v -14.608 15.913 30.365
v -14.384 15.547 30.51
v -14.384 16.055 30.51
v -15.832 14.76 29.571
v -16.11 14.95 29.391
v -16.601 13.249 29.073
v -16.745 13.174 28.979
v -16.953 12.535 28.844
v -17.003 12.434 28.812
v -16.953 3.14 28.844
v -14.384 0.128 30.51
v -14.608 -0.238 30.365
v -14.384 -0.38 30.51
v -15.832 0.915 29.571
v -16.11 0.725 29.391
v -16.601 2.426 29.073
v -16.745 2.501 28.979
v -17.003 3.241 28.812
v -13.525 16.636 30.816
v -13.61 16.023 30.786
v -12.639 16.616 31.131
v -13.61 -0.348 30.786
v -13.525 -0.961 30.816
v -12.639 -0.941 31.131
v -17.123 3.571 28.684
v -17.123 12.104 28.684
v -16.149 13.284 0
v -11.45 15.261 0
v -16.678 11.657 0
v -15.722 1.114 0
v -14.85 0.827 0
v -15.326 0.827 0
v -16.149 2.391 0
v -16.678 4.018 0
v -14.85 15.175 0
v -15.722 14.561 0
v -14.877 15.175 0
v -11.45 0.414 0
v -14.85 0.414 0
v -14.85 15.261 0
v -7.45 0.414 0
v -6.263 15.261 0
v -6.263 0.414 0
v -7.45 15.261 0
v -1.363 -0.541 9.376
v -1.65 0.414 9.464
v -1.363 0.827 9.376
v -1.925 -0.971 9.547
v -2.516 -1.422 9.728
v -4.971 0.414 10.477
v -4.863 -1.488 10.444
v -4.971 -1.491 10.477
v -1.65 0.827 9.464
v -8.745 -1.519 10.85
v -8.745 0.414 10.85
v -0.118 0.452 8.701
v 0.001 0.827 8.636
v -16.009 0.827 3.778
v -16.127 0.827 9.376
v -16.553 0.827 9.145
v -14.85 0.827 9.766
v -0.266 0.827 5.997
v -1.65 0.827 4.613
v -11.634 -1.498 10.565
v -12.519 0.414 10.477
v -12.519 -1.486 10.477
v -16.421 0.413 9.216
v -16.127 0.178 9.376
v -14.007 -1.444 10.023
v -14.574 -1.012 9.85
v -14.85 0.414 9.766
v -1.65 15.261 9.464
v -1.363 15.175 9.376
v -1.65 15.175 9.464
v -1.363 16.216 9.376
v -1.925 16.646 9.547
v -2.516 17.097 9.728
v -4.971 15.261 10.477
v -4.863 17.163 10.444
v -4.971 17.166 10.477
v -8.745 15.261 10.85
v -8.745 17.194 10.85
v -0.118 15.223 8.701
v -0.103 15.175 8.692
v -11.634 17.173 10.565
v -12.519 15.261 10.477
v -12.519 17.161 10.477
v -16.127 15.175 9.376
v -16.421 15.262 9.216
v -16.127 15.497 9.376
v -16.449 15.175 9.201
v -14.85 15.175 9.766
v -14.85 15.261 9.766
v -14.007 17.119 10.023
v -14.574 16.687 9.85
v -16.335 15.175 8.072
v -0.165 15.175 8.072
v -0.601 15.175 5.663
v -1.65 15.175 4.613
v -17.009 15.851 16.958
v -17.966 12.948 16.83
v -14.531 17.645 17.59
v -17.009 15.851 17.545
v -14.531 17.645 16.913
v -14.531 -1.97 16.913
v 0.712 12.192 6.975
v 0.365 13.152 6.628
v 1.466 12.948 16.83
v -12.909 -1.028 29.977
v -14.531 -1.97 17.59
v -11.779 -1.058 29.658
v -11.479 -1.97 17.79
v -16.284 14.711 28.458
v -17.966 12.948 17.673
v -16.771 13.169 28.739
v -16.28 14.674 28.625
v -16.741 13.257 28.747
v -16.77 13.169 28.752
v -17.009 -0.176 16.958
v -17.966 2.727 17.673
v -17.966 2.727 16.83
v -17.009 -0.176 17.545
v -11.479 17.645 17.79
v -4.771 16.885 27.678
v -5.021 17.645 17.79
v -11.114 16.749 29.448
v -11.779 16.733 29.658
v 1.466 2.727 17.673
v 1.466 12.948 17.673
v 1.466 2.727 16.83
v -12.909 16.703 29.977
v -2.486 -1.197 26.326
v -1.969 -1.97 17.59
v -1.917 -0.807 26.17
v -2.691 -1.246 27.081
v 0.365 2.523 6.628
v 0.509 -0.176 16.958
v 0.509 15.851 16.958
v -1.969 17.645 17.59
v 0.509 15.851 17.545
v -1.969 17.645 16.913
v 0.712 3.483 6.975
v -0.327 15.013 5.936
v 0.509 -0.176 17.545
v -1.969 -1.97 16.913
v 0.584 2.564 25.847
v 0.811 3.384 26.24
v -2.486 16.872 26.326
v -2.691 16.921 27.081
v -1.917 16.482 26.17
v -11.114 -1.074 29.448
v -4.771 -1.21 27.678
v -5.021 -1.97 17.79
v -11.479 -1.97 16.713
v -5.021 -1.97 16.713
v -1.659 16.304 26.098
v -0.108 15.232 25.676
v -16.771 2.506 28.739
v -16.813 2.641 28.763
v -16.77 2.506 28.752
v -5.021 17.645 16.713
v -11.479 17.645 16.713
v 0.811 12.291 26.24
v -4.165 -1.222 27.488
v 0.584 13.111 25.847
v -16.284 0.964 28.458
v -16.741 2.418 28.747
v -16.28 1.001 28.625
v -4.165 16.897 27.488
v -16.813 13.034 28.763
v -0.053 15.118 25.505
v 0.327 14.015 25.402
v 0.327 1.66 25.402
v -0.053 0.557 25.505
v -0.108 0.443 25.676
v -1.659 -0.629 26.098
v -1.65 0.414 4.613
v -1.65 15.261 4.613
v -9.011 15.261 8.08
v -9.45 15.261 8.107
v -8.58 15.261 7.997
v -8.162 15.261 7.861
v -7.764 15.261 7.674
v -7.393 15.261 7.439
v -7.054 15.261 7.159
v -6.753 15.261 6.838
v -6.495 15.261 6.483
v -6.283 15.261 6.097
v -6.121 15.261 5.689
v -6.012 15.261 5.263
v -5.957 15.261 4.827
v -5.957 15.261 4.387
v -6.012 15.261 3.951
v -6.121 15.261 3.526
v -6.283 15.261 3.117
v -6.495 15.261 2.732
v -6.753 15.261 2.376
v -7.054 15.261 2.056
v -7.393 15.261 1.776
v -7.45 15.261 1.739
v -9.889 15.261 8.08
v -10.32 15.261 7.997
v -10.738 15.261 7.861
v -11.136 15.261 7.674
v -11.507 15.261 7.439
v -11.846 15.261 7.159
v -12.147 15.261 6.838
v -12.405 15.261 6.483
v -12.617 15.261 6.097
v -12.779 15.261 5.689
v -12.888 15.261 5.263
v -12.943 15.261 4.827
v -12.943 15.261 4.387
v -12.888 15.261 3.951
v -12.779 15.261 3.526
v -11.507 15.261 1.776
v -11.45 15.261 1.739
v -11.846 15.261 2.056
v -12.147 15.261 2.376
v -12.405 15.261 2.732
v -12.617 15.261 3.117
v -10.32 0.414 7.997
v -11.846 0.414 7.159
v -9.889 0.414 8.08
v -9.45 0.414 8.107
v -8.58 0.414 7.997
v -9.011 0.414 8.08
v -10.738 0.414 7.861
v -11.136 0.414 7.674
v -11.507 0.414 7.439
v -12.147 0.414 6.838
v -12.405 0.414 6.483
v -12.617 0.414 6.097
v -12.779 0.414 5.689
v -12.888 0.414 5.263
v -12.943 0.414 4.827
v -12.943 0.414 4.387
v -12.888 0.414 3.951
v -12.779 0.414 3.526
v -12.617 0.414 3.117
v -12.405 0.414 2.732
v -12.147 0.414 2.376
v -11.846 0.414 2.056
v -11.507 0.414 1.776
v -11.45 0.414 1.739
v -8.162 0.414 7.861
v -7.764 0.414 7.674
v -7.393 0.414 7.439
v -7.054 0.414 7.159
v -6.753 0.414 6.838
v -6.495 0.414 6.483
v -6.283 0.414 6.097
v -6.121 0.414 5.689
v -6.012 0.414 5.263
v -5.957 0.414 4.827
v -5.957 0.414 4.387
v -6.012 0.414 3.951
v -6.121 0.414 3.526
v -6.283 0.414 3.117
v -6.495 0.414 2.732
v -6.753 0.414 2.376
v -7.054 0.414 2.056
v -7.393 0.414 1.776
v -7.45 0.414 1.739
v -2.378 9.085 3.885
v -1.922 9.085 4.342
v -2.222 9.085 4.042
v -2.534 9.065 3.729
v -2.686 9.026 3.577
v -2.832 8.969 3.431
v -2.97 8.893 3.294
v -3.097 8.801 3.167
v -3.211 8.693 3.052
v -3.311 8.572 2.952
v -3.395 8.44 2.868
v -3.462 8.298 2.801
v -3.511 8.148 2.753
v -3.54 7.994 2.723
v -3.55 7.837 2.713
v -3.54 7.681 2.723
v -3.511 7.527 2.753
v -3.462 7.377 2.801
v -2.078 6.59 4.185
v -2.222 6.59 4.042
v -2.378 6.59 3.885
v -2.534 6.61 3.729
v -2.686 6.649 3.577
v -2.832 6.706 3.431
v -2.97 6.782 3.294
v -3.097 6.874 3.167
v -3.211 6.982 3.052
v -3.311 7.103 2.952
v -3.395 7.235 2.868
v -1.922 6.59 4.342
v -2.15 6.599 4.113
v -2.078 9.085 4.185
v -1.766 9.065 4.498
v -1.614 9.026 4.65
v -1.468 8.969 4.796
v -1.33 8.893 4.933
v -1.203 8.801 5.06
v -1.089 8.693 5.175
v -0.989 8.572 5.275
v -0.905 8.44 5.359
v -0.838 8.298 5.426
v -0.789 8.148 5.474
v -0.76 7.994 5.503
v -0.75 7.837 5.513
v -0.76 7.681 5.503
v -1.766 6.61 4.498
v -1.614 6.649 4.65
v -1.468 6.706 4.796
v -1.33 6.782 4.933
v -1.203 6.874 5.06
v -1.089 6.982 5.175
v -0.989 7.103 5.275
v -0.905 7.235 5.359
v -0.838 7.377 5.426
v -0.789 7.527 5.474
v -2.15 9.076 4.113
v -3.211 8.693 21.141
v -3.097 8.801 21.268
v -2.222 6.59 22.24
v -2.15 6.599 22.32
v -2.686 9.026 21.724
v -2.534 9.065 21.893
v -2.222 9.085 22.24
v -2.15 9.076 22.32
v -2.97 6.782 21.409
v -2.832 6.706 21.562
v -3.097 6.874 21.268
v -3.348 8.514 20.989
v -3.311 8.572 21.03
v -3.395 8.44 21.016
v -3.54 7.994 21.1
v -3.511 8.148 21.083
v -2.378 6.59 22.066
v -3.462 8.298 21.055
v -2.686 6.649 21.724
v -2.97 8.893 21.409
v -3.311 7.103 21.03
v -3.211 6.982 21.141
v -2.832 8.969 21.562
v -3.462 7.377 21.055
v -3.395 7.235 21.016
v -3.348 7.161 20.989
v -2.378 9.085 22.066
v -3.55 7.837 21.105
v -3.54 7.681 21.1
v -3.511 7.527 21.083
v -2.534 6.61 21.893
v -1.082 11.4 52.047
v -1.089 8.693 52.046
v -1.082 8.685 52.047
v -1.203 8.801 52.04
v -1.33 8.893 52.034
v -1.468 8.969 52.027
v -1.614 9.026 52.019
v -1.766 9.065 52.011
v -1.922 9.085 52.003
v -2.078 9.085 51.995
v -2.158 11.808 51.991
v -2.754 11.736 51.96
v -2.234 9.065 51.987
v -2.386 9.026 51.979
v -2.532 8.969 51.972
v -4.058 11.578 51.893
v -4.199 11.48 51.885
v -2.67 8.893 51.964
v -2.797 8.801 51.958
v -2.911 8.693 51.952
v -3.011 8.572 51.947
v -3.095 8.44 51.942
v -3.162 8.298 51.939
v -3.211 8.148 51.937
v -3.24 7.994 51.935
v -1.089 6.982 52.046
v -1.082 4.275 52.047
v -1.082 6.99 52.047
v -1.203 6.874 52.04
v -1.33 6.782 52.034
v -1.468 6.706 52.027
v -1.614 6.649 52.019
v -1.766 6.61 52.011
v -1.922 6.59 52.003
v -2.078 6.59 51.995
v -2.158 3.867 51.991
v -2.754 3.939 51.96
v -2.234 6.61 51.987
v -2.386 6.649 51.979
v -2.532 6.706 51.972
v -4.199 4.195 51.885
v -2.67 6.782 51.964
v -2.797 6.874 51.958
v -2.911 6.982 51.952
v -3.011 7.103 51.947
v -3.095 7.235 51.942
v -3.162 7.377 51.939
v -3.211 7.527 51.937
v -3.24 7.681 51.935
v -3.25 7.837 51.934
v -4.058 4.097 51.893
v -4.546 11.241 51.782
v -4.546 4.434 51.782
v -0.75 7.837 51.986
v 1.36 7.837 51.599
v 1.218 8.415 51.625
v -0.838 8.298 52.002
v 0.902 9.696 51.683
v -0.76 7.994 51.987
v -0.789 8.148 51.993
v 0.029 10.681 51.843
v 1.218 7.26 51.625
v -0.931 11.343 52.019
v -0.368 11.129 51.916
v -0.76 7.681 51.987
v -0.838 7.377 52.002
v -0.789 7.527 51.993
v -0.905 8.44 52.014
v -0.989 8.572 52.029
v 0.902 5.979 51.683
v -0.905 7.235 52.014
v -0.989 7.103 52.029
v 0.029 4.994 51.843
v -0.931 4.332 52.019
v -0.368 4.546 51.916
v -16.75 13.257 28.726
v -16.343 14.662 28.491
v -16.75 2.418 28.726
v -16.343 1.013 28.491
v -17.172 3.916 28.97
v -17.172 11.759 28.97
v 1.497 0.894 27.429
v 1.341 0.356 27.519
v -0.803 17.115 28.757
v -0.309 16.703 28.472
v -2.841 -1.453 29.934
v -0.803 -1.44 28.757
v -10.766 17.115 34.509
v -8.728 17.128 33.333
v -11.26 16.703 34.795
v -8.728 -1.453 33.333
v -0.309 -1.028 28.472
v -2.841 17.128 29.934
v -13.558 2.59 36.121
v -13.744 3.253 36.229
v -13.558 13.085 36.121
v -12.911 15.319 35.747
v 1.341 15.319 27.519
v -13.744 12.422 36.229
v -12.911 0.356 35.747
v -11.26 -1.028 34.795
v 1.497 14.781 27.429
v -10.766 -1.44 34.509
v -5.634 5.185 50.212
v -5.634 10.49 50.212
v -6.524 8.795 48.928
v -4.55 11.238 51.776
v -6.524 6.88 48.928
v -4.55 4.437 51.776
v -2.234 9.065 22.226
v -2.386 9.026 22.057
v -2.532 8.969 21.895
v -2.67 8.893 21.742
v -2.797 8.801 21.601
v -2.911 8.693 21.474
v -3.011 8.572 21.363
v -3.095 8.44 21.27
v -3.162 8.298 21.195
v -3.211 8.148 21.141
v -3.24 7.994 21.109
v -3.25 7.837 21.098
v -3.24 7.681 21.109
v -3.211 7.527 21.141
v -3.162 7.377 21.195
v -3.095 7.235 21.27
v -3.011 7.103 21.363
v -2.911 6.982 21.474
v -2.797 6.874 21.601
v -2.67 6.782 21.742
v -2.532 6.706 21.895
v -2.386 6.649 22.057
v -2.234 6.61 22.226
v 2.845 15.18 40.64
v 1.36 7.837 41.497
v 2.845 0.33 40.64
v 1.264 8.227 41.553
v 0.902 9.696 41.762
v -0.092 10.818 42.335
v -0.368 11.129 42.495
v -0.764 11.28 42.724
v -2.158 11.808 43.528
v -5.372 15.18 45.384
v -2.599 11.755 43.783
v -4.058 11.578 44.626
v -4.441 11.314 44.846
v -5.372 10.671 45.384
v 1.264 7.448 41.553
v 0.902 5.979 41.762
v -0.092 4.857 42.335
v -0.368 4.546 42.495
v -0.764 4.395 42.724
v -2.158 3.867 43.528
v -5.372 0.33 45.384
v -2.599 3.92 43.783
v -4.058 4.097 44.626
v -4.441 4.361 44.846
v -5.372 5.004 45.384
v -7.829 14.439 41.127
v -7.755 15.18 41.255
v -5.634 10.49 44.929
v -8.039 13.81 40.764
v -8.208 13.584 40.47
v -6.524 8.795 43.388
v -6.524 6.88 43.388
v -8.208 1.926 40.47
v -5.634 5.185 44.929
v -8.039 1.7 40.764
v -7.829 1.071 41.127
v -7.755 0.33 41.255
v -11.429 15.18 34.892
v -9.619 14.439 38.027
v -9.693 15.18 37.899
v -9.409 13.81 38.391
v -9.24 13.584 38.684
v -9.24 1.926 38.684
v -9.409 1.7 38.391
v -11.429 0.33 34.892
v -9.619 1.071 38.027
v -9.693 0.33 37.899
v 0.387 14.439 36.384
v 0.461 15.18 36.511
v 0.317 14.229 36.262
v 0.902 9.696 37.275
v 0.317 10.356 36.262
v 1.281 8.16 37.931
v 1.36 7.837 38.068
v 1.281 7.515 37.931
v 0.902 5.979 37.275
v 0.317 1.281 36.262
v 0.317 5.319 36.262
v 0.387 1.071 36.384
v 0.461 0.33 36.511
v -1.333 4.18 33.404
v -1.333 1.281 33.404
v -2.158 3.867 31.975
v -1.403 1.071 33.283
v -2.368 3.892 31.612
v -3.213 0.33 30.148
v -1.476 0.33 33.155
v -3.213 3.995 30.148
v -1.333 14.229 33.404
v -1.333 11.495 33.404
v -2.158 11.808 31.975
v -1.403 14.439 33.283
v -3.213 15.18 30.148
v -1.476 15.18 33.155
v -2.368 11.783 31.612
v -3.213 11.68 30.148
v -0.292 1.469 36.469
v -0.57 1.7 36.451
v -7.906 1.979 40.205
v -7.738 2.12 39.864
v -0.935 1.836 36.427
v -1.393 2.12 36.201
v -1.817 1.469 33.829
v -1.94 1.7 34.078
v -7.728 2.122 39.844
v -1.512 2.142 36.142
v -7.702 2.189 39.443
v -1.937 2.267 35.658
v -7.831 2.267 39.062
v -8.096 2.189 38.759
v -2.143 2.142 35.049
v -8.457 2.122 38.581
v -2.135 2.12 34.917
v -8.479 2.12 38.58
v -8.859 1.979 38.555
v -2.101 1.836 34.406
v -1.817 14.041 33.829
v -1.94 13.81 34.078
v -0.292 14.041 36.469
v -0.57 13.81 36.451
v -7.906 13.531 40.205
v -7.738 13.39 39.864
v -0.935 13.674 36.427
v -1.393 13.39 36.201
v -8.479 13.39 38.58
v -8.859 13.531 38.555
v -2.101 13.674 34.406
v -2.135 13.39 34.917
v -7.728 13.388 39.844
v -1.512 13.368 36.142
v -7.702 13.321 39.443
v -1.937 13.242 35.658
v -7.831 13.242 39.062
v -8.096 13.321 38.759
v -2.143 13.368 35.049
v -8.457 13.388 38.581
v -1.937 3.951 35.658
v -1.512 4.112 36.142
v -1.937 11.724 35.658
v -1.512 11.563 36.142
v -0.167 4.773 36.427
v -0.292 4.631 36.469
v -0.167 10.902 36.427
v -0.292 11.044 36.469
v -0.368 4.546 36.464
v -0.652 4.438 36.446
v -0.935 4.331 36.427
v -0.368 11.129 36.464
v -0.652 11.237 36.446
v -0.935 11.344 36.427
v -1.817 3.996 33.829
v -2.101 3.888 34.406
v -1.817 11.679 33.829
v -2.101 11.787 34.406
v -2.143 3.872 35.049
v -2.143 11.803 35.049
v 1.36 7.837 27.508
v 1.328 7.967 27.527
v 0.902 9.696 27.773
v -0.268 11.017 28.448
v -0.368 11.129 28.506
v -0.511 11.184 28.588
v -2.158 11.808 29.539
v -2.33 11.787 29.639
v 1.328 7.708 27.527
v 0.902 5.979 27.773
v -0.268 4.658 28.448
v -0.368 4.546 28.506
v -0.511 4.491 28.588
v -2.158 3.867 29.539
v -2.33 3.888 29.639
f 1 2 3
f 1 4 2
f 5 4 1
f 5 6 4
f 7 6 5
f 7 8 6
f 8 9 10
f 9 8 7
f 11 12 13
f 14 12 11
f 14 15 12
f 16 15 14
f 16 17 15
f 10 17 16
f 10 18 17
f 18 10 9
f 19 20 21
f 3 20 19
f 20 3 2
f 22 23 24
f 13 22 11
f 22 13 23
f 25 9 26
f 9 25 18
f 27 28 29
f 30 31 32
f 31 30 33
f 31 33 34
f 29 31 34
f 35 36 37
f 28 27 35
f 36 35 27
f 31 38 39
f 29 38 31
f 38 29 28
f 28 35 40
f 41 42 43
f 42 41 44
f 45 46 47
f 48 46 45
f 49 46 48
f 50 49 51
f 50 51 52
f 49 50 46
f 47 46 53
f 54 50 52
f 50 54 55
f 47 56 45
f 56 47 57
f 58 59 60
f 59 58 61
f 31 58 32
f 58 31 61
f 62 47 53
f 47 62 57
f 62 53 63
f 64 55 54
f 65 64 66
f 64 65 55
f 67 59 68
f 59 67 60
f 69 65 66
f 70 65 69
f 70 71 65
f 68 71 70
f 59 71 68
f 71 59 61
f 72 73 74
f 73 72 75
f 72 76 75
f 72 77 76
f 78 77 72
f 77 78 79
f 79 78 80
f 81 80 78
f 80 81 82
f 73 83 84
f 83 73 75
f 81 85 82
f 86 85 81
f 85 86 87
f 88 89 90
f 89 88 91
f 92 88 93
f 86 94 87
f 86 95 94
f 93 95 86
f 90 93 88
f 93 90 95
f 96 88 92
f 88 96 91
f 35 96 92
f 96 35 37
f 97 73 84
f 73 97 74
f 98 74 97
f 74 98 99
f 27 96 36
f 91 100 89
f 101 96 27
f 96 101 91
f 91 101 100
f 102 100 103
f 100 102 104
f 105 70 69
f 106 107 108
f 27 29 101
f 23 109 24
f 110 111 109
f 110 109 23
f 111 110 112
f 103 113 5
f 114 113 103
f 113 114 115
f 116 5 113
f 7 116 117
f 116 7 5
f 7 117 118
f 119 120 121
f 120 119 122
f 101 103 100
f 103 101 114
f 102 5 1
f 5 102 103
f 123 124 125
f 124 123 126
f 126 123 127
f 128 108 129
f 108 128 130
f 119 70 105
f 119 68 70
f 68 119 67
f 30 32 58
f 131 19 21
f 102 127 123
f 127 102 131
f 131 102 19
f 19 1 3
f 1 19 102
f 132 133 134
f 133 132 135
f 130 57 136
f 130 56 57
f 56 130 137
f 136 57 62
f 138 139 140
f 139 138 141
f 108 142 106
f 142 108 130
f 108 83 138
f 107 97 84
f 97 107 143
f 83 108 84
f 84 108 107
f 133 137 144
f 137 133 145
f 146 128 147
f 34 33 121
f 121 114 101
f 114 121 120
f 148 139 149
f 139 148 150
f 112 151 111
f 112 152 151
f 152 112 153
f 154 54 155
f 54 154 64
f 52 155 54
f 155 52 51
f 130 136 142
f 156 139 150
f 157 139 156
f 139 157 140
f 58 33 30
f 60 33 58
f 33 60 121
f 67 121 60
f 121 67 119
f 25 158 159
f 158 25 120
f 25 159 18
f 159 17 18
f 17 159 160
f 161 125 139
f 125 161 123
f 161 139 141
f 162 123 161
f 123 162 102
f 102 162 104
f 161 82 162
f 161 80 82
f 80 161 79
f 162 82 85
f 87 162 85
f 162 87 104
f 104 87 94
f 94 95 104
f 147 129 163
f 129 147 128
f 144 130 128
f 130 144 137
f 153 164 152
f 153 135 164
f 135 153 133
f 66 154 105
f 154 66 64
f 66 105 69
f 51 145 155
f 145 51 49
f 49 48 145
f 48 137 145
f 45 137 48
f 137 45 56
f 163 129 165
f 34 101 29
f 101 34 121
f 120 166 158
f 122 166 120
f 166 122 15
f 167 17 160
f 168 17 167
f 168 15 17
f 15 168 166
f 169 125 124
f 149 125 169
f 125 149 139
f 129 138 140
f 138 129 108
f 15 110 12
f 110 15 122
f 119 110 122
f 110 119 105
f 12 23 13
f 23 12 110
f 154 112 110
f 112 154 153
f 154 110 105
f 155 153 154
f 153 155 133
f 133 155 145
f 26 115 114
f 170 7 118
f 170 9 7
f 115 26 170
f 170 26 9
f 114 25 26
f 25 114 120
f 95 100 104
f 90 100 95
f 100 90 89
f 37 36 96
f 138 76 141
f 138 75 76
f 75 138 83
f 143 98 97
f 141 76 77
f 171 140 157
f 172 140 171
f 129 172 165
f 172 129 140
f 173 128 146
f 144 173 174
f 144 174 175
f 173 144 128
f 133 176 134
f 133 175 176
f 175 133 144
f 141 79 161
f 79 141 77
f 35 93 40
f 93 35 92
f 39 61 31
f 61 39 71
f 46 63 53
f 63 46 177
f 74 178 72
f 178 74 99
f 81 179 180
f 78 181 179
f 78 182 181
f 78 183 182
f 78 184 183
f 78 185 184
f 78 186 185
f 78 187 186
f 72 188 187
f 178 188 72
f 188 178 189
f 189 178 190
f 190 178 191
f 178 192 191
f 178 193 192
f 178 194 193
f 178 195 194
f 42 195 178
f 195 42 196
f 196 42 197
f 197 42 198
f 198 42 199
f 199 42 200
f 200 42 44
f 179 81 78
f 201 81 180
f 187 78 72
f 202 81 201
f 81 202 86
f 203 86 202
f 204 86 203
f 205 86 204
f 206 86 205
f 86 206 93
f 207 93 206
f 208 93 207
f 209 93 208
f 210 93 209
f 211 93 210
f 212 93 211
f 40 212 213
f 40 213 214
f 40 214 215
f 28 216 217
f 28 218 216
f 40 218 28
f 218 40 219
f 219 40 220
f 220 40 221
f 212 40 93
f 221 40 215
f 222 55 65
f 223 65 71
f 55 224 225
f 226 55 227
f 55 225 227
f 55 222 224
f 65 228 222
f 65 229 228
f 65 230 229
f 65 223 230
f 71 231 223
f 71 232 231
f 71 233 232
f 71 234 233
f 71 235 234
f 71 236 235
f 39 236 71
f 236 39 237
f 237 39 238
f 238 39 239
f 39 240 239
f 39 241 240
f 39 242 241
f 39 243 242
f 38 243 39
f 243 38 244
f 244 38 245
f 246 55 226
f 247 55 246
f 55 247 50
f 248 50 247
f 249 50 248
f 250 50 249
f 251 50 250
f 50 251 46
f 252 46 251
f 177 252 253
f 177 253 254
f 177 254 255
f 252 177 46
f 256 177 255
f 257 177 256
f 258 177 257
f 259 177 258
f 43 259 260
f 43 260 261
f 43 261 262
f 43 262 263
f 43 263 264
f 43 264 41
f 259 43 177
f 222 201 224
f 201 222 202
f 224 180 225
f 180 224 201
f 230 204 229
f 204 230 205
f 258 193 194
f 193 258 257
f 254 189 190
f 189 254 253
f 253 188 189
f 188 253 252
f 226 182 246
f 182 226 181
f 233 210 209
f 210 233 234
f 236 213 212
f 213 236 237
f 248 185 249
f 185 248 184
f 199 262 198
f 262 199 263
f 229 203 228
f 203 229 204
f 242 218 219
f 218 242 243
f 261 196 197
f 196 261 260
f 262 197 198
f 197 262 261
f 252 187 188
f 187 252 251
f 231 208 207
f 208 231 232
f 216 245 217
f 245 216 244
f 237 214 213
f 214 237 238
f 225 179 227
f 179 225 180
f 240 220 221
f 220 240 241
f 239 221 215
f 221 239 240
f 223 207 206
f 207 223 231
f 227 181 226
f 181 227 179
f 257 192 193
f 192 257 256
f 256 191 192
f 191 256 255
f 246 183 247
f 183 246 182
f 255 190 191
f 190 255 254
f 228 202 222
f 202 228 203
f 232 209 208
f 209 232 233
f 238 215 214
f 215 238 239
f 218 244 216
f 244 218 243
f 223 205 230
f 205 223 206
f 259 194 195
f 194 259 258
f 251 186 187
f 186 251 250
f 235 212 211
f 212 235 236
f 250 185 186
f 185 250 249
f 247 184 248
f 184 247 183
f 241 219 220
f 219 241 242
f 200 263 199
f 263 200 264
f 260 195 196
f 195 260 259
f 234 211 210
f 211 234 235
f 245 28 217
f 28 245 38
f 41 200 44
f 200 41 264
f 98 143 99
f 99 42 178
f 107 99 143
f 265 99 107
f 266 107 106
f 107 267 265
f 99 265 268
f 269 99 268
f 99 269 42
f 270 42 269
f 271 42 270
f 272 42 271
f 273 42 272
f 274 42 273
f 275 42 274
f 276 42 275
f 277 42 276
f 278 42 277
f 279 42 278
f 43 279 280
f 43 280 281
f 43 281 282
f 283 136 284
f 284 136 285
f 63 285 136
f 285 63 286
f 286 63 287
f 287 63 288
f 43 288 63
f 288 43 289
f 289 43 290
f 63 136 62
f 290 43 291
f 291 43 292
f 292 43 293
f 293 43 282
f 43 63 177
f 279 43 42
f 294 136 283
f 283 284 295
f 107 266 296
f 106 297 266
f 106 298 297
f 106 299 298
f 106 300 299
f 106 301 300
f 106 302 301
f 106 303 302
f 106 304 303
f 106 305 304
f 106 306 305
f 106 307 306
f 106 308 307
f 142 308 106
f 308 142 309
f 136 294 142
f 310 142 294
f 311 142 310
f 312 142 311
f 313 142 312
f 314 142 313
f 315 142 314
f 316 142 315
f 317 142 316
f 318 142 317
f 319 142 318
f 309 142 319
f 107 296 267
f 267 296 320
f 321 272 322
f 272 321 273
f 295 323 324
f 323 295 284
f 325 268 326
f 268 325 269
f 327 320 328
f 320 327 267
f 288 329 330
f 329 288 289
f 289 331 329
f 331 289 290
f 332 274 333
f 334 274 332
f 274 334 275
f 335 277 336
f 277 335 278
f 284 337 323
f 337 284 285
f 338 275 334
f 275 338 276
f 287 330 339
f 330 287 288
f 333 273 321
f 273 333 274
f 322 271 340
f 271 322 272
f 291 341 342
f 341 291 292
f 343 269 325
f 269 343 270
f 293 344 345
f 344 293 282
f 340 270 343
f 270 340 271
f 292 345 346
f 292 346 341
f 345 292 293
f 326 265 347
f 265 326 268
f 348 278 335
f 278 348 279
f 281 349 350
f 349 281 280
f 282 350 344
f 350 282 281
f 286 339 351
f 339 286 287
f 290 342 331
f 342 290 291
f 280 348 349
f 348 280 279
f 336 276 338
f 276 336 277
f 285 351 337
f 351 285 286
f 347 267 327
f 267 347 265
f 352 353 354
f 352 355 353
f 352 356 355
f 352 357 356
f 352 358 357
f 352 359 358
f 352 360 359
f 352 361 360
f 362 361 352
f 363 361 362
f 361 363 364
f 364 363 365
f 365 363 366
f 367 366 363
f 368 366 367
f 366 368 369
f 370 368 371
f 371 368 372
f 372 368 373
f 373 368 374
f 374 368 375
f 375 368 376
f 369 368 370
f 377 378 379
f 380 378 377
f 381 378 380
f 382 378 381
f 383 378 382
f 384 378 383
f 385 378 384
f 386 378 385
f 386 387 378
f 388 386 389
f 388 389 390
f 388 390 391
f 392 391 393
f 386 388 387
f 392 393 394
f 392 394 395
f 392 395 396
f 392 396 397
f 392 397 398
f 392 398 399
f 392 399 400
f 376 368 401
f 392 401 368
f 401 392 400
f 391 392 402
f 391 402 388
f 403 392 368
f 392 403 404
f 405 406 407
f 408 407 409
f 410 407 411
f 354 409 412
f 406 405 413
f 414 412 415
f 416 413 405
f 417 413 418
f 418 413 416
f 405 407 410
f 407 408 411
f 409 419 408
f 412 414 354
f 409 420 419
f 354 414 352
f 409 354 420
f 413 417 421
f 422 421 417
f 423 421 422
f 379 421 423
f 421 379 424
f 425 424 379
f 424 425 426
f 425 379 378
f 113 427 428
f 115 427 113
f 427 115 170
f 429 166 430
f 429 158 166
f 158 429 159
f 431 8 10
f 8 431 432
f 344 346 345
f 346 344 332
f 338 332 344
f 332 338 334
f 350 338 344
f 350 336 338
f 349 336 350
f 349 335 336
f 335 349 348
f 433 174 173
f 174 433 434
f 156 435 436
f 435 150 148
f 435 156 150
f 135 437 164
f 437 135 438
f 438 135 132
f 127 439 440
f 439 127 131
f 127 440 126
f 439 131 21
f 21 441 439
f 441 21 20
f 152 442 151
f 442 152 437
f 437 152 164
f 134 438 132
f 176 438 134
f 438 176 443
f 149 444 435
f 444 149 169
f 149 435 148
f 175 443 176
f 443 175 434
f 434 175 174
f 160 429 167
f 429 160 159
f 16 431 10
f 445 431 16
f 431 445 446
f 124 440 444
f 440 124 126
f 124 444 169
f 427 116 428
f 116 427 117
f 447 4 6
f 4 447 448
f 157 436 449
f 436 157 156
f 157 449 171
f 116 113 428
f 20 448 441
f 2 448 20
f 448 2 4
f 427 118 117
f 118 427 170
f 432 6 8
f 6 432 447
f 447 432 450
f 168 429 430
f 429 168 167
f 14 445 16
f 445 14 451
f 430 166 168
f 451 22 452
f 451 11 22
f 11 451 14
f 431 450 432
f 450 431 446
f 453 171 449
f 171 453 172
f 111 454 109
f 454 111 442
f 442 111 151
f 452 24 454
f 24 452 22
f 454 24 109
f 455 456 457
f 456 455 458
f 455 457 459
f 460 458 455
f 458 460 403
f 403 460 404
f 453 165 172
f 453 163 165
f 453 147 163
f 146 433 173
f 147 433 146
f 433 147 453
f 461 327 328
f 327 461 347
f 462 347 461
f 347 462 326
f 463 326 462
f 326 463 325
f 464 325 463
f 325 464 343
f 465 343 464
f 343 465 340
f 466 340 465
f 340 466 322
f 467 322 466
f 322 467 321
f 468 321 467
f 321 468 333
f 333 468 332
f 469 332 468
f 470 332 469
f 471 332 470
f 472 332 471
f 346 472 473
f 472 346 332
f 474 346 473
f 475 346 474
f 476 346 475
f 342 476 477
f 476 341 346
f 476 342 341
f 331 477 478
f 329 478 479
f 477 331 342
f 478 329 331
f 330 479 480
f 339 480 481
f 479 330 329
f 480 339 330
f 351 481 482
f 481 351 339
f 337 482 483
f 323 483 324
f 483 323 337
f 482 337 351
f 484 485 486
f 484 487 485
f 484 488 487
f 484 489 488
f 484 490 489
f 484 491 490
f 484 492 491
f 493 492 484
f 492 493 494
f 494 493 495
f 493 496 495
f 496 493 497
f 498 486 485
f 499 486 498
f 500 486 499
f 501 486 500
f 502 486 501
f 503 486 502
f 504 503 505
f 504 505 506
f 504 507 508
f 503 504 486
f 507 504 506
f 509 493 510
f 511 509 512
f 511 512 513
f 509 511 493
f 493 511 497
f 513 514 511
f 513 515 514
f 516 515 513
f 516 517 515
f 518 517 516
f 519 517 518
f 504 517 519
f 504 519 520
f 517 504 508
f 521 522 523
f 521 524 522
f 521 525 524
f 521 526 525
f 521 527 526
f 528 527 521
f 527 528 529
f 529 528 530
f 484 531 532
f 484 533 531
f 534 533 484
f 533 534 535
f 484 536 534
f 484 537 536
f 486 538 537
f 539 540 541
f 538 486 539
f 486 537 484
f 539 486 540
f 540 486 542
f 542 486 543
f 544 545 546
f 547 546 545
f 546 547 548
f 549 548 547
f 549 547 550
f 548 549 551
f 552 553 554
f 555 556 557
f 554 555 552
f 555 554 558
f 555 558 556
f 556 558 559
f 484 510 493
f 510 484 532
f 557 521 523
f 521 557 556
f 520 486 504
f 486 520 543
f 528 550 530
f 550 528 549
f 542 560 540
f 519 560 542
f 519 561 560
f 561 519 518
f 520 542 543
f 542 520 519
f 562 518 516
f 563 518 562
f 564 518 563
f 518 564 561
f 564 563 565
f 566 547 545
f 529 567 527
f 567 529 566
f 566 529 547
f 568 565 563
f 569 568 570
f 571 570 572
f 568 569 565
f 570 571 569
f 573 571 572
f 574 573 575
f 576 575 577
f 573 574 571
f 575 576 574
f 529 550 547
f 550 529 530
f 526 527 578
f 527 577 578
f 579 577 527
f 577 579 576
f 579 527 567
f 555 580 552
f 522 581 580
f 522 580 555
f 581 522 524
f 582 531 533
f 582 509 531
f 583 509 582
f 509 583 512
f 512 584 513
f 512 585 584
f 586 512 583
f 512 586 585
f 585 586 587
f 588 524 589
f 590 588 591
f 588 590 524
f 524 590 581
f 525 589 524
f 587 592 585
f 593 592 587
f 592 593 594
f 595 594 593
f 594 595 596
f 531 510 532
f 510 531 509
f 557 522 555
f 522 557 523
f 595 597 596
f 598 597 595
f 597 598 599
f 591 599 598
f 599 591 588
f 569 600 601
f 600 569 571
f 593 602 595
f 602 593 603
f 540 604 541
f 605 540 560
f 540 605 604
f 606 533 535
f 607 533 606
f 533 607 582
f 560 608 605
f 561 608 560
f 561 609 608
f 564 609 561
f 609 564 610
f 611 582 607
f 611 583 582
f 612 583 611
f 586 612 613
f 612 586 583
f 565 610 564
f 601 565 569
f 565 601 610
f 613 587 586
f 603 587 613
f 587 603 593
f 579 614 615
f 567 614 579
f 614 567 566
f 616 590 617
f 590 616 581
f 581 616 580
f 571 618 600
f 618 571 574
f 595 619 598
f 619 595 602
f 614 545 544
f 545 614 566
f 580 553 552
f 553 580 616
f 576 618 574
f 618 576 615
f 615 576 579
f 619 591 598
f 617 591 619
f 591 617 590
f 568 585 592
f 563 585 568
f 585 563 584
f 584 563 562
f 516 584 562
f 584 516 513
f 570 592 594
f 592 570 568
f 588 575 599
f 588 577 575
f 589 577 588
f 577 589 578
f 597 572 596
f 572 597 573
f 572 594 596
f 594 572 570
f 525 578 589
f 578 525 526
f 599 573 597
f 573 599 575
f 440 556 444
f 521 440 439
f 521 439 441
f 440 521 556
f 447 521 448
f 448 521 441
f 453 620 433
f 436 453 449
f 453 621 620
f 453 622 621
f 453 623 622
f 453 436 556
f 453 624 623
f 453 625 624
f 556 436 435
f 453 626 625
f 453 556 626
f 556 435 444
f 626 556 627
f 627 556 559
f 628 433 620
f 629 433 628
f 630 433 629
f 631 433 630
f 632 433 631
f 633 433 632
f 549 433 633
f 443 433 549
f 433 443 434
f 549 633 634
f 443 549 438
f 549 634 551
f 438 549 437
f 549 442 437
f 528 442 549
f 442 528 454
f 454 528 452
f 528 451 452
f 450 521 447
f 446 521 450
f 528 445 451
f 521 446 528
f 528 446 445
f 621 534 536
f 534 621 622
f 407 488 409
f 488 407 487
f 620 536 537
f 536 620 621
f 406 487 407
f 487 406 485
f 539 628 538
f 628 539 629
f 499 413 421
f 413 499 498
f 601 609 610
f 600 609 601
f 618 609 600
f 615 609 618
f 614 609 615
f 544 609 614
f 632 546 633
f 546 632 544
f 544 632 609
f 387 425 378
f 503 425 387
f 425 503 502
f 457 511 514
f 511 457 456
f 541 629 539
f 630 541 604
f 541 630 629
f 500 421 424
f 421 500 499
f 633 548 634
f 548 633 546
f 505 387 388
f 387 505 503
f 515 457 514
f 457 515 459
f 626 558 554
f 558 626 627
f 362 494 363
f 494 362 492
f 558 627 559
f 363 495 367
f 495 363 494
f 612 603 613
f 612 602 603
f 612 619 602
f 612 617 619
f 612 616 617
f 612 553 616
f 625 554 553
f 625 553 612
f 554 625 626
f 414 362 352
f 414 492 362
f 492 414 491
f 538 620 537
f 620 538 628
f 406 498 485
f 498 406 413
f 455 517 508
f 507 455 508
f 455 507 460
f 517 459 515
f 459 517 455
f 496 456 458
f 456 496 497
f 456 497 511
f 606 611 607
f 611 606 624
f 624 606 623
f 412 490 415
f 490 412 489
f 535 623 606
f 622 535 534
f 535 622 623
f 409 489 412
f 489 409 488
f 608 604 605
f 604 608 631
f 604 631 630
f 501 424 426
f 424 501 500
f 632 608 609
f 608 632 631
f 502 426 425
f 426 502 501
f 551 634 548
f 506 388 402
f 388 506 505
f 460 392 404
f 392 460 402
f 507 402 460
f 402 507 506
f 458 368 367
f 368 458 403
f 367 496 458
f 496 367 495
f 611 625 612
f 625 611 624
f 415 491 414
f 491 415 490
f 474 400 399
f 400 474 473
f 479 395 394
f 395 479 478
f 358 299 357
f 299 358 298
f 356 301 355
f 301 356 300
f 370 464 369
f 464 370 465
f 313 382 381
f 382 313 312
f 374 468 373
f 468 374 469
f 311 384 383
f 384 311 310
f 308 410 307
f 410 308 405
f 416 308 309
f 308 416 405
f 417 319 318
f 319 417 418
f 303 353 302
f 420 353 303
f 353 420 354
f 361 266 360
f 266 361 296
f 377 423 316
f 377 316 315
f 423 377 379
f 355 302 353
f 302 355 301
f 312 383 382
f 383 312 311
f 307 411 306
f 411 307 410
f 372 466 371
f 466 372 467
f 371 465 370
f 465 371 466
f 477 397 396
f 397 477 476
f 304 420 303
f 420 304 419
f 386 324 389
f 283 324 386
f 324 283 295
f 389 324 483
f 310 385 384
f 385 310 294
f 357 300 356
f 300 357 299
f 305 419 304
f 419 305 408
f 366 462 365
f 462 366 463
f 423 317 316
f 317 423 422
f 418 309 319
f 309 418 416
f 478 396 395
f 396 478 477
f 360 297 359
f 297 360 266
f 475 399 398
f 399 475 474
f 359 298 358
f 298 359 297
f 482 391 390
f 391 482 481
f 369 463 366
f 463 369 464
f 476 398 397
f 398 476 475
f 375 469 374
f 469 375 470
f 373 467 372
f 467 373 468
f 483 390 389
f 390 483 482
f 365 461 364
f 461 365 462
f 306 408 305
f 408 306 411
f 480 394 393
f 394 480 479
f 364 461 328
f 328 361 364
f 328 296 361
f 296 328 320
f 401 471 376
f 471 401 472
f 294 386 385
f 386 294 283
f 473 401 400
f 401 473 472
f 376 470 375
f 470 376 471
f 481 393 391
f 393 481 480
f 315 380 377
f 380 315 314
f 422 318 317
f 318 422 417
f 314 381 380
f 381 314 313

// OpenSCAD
// file: util/finger_mid.scad
include <../../config.scad>
use <finger_base.scad>

rotate([0,-90,0]) fingermid();

//	Middle segment of finger, can be lengthened
module fingermid(length=19, proximalHole=true, distalHole=true)
{
	difference() {
		scale([yScaleFactor,xScaleFactor,zScaleFactor]) {
			fingerbasesolid(length);
		}
		if(proximalHole) {
			translate([0,knucklePadding/2 * xScaleFactor,0]) fingerhardwarecutouts(jointDia, jointThick, knuckleW=knuckleW-knucklePadding, fingerLen=length);
		}
		if(distalHole) {
			translate([length * yScaleFactor,0,0]) mirror([1,0,0]) fingerhardwarecutouts(jointDia, jointThick, knuckleW=knuckleW, fingerLen=length);
		}
	}
}
// file: util/finger_base.scad
include <../../config.scad>

rotate([0,-90,0]) fingerbase();

//	Base segment of finger, can be lengthened
module fingerbase(length=20, proximalHole=true, distalHole=true)
{
	difference() {
		scale([yScaleFactor,xScaleFactor,zScaleFactor]) {
			fingerbasesolid(length);
		}
		if(proximalHole) {
			translate([0,knucklePadding/2 * xScaleFactor,0]) fingerhardwarecutouts(jointDia, jointThick, knuckleW=knuckleW-knucklePadding, fingerLen=length);
		}
		if (distalHole) {
			translate([length * yScaleFactor,0,0]) mirror([1,0,0]) fingerhardwarecutouts(jointDia, jointThick, knuckleW=knuckleW, fingerLen=length);
		}
	}


	
}

module fingerhardwarecutouts(jointDia,jointThick,knuckleW,fingerLen,holeCutoff=100) {
	//slot for flex joint
	translate([7 - (15/jointDia),0,6*zScaleFactor - (1.8/jointThick)]) {
		rotate([90,0,0]) translate([-0.25,0,-knuckleW*xScaleFactor]) cylinder(d=jointDia, h=knuckleW*xScaleFactor, $fn=50);
		translate([-25,(knuckleW*xScaleFactor) / 2,0]) cube([50,knuckleW*xScaleFactor,jointThick], center=true);
	}
	//cubic parts
	translate([-100,0,0]) cube([100,knuckleW*xScaleFactor,100]);
	translate([-13/zScaleFactor,0,0]) rotate([0,45,0]) translate([-50,0,0]) cube([100,knuckleW * xScaleFactor, 10]);

	//channel for string/tendon
	translate([-fingerLen/2 * yScaleFactor, knuckleW/2 * xScaleFactor, 2.3]) rotate([0,90,0]) cylinder(d=2.5, h=holeCutoff, $fn=50);
}

//	base segment of finger, solid
module fingerbasesolid(length=50, cutout=true) {
	difference() {
		//cubic part
		translate([0,0.001 + knucklePadding/2,1]) cube([length, knuckleW - knucklePadding - 0.002, 8]);
	}
	
	//cylindrical-ish part around finger
	intersection() {
		//overly large shape to get the cross section in the XZ plane from
		difference() {
			union() {
				translate([length-4,-5,5]) rotate([-90,0,0]) cylinder(r=8,h=knuckleW + 10);
				translate([0,-5,-5]) cube([length,knuckleW + 10,20]);
			}
			//cutout for the side "guards" of the previous knuckle
			if(cutout) {
				translate([-4,-knuckleW+0.001,5.3]) rotate([-90,0,0]) cylinder(r=11,h=10);
				translate([-4,knuckleW - knucklePadding*(1/xScaleFactor),5.3]) rotate([-90,0,0]) cylinder(r=11,h=10);
			}
		}

		hull() {
			for(i=[-1,1], j=[-1,1]) {
				//angled cylinders to provide the outer shape of the finger
				translate([length/10,i*2.4 + knuckleW/2,j*2.2 + 5]) rotate([i*j*-4,j*86,0]) cylinder(d=6,h=20,center=true);
				translate([length+4, i*2.4 + knuckleW/2, j*2.2 + 5]) rotate([i*j*-4,j*-86,0]) cylinder(d=6,h=20,center=true);
			}
		}
	}
}
// file: util/finger_tip.scad
include <../../config.scad>
use <finger_base.scad>
use <finger_mid.scad>

rotate([0,-90,0]) fingertip_curved_solid(pad=fingerPads);

module fingertip_curved_solid(length=17, pad=true, hole=true) {
//	if (!pad)
//		fingertip(length=length);
//	else {
		render() difference() {
			union() {
				fingermid(length=length+3, proximalHole=true, distalHole=false);
				translate([length*yScaleFactor - 0.5,0,1.6*zScaleFactor]) rotate([0,30,0]) fingertip(length=15, proximalHole=false, cutout=false);
			}
			//hole for string
			if(hole) translate([0,xScaleFactor * knuckleW/2,2]) rotate([0,90,0]) cylinder(d=2.5,h=100, $fn=50);
			//hollow for soft pad
			if(pad) translate([length*yScaleFactor - 0.5,0,1.6*zScaleFactor]) rotate([0,30,0]) fingertip_pad(length=15);
		}
//	}
}

module fingertip_solid(length=15, pad=true) {
	if (!pad)
		fingertip(length=length);
	else {
		render() difference() {
			fingertip(length=length);
			if(pad) fingertip_pad(length);
		}
	}
}

module fingertip_pad(length) {
	difference() {
		fingertip(length,pad=false, proximalHole=false, cutout=false);
		translate([0,-10,-10]) cube([length-7,50,50]);
		assign($fn = 16) difference() {
			translate([0,0.2*xScaleFactor,3.2*zScaleFactor]) cube([length+(3.3*yScaleFactor),xScaleFactor * (knuckleW - knucklePadding),5.75*zScaleFactor]);
			//grooves for attachment of silicone pad:
			translate([(length+(3.3*yScaleFactor))/3*2, 0.2*xScaleFactor, 3.2*zScaleFactor]) cylinder(d=2.5*yScaleFactor,h=5.75*zScaleFactor);
			translate([(length+(3.3*yScaleFactor))/3*2, 0.2*xScaleFactor + (xScaleFactor * (knuckleW - knucklePadding)), 3.2*zScaleFactor]) cylinder(d=2.5*yScaleFactor,h=5.75*zScaleFactor);
			translate([(length+(3.3*yScaleFactor))/3*2, 0.2*xScaleFactor, 3.2*zScaleFactor]) rotate([-90,0,0]) cylinder(d=2*zScaleFactor,h=xScaleFactor * (knuckleW - knucklePadding));
			translate([(length+(3.3*yScaleFactor))/3*2, 0.2*xScaleFactor, 3.2*zScaleFactor + 5.75*zScaleFactor]) rotate([-90,0,0]) cylinder(d=1.25*zScaleFactor,h=xScaleFactor * (knuckleW - knucklePadding));
		}
		//"fingernail":
		translate([0,xScaleFactor * knuckleW/2,0]) {
			rotate([0,60,0]) cylinder(d=8, h=100);
		}
	}
}

//	tip segment of finger, can be lengthened
module fingertip(length=15, proximalHole=true, cutout=true)
{
	intersection() {
		difference() {
			scale([yScaleFactor,xScaleFactor,zScaleFactor]) {
				fingerbasesolid(length,cutout);
			}
			if(proximalHole) {
				translate([0,knucklePadding/2 * xScaleFactor,0]) fingerhardwarecutouts(jointDia, jointThick, knuckleW=knuckleW-knucklePadding, fingerLen=length, holeCutoff=(length-0.5)*2);
				translate([(length - 5) * yScaleFactor,(knuckleW/2) * xScaleFactor,0])
					rotate([0,30,0]) translate([0,0,2]) cylinder(d=2.5, h=100, $fn=50);
			}
		}
		translate([(length-10)*xScaleFactor,0,21*zScaleFactor]) rotate([-90,0,0]) cylinder(d=70, h=100, center=true);
	}
}
// file: ../config.scad
/**
 * Configuration settings for Flexy Beast, required to generate correctly sized STLs of the printed parts. See the Configuration File Assembly instructions to set this up.
 * @id config_file
 * @name Configuration File
 * @category Prerequisites!
 * @step Open config.scad in your favorite text editor.
 * @step As per the normal Cyborg Beast instructions, measure the width of the knuckles in the non-affected hand and convert to millimeters.
 * @step Add 5 to that result and then divide by 55.
 * @step Replace the x-, y-, and zScaleFactor variables in config.scad with that number.
 * @step If desired, adjust the proportions of the hand by changing those variables individually. xScaleFactor controls the width of the hand, yScaleFactor controls the length, and zScaleFactor controls the height.
 * @step Open assembly.scad in OpenSCAD to check that the flexy joint holes are not too large for the hand (should only be necessary for small children). If necessary, reduce the jointDia and jointThick variables. jointDia=5 and jointThick=2 is a good amount for smaller hands.
 * @step Set the fingerPads variable to true or false depending on whether you want to cast silicone finger pads for improved grip.
 * @step Open palm.scad, finger_base.scad, finger_tip.scad, and thumb_tip.scad in OpenSCAD, render each part (F6), and export as STL, then print. Suggested print settings are 0.2mm or smaller layer height, 3 perimeters, and 25% rectilinear or hexagonal infill.
 */

knuckleR = 4.85;
knucklePadding = 0.5;
knuckleW = 9.5;
wristH = 10;
palmH = 20;
palmW = 64;
th = 3;
fn = 32;

//flexy joint parameters
jointDia = 7;
jointThick = 4;

//finger settings
fingerPads = true; //whether or not to hollow the finger tips slightly for molding pads
fingerLength = 1; //multiply the length of all fingers by this amount
thumbProp = 0.8; //proportion of thumb length relative to other fingers (note that the thumb is a segment shorter than the other fingers already)
indexProp = 0.8; //proportion of index finger length relative to other fingers
middleProp = 1; //proportion of middle finger length relative to other fingers
ringProp = 0.8; //proportion of ring finger length relative to other fingers
pinkyProp = 0.7; //proportion of pinky finger length relative to other fingers

//misc settings
thermoform = true; //whether or not to generate a thermoformable mesh for the palm

//desired scale factor for hand based on the standard Cyborg Beast/Robohand sizing guide
xScaleFactor = 1.65; // [1.05:1.60]
yScaleFactor = 1.55; // [1.05:1.60]
zScaleFactor = 1.65; // [1.05:1.60]
// main file
include <../config.scad>
use <util/finger_tip.scad>

rotate([0,-90,0]) fingertip_curved_solid(length = 17*indexProp*fingerLength, pad=fingerPads);

/**
 * Distal phalanx of index finger - rendered from parts/finger_index_tip.scad
 * @id index_tip
 * @name Index Finger Tip
 * @category Printed
 */
